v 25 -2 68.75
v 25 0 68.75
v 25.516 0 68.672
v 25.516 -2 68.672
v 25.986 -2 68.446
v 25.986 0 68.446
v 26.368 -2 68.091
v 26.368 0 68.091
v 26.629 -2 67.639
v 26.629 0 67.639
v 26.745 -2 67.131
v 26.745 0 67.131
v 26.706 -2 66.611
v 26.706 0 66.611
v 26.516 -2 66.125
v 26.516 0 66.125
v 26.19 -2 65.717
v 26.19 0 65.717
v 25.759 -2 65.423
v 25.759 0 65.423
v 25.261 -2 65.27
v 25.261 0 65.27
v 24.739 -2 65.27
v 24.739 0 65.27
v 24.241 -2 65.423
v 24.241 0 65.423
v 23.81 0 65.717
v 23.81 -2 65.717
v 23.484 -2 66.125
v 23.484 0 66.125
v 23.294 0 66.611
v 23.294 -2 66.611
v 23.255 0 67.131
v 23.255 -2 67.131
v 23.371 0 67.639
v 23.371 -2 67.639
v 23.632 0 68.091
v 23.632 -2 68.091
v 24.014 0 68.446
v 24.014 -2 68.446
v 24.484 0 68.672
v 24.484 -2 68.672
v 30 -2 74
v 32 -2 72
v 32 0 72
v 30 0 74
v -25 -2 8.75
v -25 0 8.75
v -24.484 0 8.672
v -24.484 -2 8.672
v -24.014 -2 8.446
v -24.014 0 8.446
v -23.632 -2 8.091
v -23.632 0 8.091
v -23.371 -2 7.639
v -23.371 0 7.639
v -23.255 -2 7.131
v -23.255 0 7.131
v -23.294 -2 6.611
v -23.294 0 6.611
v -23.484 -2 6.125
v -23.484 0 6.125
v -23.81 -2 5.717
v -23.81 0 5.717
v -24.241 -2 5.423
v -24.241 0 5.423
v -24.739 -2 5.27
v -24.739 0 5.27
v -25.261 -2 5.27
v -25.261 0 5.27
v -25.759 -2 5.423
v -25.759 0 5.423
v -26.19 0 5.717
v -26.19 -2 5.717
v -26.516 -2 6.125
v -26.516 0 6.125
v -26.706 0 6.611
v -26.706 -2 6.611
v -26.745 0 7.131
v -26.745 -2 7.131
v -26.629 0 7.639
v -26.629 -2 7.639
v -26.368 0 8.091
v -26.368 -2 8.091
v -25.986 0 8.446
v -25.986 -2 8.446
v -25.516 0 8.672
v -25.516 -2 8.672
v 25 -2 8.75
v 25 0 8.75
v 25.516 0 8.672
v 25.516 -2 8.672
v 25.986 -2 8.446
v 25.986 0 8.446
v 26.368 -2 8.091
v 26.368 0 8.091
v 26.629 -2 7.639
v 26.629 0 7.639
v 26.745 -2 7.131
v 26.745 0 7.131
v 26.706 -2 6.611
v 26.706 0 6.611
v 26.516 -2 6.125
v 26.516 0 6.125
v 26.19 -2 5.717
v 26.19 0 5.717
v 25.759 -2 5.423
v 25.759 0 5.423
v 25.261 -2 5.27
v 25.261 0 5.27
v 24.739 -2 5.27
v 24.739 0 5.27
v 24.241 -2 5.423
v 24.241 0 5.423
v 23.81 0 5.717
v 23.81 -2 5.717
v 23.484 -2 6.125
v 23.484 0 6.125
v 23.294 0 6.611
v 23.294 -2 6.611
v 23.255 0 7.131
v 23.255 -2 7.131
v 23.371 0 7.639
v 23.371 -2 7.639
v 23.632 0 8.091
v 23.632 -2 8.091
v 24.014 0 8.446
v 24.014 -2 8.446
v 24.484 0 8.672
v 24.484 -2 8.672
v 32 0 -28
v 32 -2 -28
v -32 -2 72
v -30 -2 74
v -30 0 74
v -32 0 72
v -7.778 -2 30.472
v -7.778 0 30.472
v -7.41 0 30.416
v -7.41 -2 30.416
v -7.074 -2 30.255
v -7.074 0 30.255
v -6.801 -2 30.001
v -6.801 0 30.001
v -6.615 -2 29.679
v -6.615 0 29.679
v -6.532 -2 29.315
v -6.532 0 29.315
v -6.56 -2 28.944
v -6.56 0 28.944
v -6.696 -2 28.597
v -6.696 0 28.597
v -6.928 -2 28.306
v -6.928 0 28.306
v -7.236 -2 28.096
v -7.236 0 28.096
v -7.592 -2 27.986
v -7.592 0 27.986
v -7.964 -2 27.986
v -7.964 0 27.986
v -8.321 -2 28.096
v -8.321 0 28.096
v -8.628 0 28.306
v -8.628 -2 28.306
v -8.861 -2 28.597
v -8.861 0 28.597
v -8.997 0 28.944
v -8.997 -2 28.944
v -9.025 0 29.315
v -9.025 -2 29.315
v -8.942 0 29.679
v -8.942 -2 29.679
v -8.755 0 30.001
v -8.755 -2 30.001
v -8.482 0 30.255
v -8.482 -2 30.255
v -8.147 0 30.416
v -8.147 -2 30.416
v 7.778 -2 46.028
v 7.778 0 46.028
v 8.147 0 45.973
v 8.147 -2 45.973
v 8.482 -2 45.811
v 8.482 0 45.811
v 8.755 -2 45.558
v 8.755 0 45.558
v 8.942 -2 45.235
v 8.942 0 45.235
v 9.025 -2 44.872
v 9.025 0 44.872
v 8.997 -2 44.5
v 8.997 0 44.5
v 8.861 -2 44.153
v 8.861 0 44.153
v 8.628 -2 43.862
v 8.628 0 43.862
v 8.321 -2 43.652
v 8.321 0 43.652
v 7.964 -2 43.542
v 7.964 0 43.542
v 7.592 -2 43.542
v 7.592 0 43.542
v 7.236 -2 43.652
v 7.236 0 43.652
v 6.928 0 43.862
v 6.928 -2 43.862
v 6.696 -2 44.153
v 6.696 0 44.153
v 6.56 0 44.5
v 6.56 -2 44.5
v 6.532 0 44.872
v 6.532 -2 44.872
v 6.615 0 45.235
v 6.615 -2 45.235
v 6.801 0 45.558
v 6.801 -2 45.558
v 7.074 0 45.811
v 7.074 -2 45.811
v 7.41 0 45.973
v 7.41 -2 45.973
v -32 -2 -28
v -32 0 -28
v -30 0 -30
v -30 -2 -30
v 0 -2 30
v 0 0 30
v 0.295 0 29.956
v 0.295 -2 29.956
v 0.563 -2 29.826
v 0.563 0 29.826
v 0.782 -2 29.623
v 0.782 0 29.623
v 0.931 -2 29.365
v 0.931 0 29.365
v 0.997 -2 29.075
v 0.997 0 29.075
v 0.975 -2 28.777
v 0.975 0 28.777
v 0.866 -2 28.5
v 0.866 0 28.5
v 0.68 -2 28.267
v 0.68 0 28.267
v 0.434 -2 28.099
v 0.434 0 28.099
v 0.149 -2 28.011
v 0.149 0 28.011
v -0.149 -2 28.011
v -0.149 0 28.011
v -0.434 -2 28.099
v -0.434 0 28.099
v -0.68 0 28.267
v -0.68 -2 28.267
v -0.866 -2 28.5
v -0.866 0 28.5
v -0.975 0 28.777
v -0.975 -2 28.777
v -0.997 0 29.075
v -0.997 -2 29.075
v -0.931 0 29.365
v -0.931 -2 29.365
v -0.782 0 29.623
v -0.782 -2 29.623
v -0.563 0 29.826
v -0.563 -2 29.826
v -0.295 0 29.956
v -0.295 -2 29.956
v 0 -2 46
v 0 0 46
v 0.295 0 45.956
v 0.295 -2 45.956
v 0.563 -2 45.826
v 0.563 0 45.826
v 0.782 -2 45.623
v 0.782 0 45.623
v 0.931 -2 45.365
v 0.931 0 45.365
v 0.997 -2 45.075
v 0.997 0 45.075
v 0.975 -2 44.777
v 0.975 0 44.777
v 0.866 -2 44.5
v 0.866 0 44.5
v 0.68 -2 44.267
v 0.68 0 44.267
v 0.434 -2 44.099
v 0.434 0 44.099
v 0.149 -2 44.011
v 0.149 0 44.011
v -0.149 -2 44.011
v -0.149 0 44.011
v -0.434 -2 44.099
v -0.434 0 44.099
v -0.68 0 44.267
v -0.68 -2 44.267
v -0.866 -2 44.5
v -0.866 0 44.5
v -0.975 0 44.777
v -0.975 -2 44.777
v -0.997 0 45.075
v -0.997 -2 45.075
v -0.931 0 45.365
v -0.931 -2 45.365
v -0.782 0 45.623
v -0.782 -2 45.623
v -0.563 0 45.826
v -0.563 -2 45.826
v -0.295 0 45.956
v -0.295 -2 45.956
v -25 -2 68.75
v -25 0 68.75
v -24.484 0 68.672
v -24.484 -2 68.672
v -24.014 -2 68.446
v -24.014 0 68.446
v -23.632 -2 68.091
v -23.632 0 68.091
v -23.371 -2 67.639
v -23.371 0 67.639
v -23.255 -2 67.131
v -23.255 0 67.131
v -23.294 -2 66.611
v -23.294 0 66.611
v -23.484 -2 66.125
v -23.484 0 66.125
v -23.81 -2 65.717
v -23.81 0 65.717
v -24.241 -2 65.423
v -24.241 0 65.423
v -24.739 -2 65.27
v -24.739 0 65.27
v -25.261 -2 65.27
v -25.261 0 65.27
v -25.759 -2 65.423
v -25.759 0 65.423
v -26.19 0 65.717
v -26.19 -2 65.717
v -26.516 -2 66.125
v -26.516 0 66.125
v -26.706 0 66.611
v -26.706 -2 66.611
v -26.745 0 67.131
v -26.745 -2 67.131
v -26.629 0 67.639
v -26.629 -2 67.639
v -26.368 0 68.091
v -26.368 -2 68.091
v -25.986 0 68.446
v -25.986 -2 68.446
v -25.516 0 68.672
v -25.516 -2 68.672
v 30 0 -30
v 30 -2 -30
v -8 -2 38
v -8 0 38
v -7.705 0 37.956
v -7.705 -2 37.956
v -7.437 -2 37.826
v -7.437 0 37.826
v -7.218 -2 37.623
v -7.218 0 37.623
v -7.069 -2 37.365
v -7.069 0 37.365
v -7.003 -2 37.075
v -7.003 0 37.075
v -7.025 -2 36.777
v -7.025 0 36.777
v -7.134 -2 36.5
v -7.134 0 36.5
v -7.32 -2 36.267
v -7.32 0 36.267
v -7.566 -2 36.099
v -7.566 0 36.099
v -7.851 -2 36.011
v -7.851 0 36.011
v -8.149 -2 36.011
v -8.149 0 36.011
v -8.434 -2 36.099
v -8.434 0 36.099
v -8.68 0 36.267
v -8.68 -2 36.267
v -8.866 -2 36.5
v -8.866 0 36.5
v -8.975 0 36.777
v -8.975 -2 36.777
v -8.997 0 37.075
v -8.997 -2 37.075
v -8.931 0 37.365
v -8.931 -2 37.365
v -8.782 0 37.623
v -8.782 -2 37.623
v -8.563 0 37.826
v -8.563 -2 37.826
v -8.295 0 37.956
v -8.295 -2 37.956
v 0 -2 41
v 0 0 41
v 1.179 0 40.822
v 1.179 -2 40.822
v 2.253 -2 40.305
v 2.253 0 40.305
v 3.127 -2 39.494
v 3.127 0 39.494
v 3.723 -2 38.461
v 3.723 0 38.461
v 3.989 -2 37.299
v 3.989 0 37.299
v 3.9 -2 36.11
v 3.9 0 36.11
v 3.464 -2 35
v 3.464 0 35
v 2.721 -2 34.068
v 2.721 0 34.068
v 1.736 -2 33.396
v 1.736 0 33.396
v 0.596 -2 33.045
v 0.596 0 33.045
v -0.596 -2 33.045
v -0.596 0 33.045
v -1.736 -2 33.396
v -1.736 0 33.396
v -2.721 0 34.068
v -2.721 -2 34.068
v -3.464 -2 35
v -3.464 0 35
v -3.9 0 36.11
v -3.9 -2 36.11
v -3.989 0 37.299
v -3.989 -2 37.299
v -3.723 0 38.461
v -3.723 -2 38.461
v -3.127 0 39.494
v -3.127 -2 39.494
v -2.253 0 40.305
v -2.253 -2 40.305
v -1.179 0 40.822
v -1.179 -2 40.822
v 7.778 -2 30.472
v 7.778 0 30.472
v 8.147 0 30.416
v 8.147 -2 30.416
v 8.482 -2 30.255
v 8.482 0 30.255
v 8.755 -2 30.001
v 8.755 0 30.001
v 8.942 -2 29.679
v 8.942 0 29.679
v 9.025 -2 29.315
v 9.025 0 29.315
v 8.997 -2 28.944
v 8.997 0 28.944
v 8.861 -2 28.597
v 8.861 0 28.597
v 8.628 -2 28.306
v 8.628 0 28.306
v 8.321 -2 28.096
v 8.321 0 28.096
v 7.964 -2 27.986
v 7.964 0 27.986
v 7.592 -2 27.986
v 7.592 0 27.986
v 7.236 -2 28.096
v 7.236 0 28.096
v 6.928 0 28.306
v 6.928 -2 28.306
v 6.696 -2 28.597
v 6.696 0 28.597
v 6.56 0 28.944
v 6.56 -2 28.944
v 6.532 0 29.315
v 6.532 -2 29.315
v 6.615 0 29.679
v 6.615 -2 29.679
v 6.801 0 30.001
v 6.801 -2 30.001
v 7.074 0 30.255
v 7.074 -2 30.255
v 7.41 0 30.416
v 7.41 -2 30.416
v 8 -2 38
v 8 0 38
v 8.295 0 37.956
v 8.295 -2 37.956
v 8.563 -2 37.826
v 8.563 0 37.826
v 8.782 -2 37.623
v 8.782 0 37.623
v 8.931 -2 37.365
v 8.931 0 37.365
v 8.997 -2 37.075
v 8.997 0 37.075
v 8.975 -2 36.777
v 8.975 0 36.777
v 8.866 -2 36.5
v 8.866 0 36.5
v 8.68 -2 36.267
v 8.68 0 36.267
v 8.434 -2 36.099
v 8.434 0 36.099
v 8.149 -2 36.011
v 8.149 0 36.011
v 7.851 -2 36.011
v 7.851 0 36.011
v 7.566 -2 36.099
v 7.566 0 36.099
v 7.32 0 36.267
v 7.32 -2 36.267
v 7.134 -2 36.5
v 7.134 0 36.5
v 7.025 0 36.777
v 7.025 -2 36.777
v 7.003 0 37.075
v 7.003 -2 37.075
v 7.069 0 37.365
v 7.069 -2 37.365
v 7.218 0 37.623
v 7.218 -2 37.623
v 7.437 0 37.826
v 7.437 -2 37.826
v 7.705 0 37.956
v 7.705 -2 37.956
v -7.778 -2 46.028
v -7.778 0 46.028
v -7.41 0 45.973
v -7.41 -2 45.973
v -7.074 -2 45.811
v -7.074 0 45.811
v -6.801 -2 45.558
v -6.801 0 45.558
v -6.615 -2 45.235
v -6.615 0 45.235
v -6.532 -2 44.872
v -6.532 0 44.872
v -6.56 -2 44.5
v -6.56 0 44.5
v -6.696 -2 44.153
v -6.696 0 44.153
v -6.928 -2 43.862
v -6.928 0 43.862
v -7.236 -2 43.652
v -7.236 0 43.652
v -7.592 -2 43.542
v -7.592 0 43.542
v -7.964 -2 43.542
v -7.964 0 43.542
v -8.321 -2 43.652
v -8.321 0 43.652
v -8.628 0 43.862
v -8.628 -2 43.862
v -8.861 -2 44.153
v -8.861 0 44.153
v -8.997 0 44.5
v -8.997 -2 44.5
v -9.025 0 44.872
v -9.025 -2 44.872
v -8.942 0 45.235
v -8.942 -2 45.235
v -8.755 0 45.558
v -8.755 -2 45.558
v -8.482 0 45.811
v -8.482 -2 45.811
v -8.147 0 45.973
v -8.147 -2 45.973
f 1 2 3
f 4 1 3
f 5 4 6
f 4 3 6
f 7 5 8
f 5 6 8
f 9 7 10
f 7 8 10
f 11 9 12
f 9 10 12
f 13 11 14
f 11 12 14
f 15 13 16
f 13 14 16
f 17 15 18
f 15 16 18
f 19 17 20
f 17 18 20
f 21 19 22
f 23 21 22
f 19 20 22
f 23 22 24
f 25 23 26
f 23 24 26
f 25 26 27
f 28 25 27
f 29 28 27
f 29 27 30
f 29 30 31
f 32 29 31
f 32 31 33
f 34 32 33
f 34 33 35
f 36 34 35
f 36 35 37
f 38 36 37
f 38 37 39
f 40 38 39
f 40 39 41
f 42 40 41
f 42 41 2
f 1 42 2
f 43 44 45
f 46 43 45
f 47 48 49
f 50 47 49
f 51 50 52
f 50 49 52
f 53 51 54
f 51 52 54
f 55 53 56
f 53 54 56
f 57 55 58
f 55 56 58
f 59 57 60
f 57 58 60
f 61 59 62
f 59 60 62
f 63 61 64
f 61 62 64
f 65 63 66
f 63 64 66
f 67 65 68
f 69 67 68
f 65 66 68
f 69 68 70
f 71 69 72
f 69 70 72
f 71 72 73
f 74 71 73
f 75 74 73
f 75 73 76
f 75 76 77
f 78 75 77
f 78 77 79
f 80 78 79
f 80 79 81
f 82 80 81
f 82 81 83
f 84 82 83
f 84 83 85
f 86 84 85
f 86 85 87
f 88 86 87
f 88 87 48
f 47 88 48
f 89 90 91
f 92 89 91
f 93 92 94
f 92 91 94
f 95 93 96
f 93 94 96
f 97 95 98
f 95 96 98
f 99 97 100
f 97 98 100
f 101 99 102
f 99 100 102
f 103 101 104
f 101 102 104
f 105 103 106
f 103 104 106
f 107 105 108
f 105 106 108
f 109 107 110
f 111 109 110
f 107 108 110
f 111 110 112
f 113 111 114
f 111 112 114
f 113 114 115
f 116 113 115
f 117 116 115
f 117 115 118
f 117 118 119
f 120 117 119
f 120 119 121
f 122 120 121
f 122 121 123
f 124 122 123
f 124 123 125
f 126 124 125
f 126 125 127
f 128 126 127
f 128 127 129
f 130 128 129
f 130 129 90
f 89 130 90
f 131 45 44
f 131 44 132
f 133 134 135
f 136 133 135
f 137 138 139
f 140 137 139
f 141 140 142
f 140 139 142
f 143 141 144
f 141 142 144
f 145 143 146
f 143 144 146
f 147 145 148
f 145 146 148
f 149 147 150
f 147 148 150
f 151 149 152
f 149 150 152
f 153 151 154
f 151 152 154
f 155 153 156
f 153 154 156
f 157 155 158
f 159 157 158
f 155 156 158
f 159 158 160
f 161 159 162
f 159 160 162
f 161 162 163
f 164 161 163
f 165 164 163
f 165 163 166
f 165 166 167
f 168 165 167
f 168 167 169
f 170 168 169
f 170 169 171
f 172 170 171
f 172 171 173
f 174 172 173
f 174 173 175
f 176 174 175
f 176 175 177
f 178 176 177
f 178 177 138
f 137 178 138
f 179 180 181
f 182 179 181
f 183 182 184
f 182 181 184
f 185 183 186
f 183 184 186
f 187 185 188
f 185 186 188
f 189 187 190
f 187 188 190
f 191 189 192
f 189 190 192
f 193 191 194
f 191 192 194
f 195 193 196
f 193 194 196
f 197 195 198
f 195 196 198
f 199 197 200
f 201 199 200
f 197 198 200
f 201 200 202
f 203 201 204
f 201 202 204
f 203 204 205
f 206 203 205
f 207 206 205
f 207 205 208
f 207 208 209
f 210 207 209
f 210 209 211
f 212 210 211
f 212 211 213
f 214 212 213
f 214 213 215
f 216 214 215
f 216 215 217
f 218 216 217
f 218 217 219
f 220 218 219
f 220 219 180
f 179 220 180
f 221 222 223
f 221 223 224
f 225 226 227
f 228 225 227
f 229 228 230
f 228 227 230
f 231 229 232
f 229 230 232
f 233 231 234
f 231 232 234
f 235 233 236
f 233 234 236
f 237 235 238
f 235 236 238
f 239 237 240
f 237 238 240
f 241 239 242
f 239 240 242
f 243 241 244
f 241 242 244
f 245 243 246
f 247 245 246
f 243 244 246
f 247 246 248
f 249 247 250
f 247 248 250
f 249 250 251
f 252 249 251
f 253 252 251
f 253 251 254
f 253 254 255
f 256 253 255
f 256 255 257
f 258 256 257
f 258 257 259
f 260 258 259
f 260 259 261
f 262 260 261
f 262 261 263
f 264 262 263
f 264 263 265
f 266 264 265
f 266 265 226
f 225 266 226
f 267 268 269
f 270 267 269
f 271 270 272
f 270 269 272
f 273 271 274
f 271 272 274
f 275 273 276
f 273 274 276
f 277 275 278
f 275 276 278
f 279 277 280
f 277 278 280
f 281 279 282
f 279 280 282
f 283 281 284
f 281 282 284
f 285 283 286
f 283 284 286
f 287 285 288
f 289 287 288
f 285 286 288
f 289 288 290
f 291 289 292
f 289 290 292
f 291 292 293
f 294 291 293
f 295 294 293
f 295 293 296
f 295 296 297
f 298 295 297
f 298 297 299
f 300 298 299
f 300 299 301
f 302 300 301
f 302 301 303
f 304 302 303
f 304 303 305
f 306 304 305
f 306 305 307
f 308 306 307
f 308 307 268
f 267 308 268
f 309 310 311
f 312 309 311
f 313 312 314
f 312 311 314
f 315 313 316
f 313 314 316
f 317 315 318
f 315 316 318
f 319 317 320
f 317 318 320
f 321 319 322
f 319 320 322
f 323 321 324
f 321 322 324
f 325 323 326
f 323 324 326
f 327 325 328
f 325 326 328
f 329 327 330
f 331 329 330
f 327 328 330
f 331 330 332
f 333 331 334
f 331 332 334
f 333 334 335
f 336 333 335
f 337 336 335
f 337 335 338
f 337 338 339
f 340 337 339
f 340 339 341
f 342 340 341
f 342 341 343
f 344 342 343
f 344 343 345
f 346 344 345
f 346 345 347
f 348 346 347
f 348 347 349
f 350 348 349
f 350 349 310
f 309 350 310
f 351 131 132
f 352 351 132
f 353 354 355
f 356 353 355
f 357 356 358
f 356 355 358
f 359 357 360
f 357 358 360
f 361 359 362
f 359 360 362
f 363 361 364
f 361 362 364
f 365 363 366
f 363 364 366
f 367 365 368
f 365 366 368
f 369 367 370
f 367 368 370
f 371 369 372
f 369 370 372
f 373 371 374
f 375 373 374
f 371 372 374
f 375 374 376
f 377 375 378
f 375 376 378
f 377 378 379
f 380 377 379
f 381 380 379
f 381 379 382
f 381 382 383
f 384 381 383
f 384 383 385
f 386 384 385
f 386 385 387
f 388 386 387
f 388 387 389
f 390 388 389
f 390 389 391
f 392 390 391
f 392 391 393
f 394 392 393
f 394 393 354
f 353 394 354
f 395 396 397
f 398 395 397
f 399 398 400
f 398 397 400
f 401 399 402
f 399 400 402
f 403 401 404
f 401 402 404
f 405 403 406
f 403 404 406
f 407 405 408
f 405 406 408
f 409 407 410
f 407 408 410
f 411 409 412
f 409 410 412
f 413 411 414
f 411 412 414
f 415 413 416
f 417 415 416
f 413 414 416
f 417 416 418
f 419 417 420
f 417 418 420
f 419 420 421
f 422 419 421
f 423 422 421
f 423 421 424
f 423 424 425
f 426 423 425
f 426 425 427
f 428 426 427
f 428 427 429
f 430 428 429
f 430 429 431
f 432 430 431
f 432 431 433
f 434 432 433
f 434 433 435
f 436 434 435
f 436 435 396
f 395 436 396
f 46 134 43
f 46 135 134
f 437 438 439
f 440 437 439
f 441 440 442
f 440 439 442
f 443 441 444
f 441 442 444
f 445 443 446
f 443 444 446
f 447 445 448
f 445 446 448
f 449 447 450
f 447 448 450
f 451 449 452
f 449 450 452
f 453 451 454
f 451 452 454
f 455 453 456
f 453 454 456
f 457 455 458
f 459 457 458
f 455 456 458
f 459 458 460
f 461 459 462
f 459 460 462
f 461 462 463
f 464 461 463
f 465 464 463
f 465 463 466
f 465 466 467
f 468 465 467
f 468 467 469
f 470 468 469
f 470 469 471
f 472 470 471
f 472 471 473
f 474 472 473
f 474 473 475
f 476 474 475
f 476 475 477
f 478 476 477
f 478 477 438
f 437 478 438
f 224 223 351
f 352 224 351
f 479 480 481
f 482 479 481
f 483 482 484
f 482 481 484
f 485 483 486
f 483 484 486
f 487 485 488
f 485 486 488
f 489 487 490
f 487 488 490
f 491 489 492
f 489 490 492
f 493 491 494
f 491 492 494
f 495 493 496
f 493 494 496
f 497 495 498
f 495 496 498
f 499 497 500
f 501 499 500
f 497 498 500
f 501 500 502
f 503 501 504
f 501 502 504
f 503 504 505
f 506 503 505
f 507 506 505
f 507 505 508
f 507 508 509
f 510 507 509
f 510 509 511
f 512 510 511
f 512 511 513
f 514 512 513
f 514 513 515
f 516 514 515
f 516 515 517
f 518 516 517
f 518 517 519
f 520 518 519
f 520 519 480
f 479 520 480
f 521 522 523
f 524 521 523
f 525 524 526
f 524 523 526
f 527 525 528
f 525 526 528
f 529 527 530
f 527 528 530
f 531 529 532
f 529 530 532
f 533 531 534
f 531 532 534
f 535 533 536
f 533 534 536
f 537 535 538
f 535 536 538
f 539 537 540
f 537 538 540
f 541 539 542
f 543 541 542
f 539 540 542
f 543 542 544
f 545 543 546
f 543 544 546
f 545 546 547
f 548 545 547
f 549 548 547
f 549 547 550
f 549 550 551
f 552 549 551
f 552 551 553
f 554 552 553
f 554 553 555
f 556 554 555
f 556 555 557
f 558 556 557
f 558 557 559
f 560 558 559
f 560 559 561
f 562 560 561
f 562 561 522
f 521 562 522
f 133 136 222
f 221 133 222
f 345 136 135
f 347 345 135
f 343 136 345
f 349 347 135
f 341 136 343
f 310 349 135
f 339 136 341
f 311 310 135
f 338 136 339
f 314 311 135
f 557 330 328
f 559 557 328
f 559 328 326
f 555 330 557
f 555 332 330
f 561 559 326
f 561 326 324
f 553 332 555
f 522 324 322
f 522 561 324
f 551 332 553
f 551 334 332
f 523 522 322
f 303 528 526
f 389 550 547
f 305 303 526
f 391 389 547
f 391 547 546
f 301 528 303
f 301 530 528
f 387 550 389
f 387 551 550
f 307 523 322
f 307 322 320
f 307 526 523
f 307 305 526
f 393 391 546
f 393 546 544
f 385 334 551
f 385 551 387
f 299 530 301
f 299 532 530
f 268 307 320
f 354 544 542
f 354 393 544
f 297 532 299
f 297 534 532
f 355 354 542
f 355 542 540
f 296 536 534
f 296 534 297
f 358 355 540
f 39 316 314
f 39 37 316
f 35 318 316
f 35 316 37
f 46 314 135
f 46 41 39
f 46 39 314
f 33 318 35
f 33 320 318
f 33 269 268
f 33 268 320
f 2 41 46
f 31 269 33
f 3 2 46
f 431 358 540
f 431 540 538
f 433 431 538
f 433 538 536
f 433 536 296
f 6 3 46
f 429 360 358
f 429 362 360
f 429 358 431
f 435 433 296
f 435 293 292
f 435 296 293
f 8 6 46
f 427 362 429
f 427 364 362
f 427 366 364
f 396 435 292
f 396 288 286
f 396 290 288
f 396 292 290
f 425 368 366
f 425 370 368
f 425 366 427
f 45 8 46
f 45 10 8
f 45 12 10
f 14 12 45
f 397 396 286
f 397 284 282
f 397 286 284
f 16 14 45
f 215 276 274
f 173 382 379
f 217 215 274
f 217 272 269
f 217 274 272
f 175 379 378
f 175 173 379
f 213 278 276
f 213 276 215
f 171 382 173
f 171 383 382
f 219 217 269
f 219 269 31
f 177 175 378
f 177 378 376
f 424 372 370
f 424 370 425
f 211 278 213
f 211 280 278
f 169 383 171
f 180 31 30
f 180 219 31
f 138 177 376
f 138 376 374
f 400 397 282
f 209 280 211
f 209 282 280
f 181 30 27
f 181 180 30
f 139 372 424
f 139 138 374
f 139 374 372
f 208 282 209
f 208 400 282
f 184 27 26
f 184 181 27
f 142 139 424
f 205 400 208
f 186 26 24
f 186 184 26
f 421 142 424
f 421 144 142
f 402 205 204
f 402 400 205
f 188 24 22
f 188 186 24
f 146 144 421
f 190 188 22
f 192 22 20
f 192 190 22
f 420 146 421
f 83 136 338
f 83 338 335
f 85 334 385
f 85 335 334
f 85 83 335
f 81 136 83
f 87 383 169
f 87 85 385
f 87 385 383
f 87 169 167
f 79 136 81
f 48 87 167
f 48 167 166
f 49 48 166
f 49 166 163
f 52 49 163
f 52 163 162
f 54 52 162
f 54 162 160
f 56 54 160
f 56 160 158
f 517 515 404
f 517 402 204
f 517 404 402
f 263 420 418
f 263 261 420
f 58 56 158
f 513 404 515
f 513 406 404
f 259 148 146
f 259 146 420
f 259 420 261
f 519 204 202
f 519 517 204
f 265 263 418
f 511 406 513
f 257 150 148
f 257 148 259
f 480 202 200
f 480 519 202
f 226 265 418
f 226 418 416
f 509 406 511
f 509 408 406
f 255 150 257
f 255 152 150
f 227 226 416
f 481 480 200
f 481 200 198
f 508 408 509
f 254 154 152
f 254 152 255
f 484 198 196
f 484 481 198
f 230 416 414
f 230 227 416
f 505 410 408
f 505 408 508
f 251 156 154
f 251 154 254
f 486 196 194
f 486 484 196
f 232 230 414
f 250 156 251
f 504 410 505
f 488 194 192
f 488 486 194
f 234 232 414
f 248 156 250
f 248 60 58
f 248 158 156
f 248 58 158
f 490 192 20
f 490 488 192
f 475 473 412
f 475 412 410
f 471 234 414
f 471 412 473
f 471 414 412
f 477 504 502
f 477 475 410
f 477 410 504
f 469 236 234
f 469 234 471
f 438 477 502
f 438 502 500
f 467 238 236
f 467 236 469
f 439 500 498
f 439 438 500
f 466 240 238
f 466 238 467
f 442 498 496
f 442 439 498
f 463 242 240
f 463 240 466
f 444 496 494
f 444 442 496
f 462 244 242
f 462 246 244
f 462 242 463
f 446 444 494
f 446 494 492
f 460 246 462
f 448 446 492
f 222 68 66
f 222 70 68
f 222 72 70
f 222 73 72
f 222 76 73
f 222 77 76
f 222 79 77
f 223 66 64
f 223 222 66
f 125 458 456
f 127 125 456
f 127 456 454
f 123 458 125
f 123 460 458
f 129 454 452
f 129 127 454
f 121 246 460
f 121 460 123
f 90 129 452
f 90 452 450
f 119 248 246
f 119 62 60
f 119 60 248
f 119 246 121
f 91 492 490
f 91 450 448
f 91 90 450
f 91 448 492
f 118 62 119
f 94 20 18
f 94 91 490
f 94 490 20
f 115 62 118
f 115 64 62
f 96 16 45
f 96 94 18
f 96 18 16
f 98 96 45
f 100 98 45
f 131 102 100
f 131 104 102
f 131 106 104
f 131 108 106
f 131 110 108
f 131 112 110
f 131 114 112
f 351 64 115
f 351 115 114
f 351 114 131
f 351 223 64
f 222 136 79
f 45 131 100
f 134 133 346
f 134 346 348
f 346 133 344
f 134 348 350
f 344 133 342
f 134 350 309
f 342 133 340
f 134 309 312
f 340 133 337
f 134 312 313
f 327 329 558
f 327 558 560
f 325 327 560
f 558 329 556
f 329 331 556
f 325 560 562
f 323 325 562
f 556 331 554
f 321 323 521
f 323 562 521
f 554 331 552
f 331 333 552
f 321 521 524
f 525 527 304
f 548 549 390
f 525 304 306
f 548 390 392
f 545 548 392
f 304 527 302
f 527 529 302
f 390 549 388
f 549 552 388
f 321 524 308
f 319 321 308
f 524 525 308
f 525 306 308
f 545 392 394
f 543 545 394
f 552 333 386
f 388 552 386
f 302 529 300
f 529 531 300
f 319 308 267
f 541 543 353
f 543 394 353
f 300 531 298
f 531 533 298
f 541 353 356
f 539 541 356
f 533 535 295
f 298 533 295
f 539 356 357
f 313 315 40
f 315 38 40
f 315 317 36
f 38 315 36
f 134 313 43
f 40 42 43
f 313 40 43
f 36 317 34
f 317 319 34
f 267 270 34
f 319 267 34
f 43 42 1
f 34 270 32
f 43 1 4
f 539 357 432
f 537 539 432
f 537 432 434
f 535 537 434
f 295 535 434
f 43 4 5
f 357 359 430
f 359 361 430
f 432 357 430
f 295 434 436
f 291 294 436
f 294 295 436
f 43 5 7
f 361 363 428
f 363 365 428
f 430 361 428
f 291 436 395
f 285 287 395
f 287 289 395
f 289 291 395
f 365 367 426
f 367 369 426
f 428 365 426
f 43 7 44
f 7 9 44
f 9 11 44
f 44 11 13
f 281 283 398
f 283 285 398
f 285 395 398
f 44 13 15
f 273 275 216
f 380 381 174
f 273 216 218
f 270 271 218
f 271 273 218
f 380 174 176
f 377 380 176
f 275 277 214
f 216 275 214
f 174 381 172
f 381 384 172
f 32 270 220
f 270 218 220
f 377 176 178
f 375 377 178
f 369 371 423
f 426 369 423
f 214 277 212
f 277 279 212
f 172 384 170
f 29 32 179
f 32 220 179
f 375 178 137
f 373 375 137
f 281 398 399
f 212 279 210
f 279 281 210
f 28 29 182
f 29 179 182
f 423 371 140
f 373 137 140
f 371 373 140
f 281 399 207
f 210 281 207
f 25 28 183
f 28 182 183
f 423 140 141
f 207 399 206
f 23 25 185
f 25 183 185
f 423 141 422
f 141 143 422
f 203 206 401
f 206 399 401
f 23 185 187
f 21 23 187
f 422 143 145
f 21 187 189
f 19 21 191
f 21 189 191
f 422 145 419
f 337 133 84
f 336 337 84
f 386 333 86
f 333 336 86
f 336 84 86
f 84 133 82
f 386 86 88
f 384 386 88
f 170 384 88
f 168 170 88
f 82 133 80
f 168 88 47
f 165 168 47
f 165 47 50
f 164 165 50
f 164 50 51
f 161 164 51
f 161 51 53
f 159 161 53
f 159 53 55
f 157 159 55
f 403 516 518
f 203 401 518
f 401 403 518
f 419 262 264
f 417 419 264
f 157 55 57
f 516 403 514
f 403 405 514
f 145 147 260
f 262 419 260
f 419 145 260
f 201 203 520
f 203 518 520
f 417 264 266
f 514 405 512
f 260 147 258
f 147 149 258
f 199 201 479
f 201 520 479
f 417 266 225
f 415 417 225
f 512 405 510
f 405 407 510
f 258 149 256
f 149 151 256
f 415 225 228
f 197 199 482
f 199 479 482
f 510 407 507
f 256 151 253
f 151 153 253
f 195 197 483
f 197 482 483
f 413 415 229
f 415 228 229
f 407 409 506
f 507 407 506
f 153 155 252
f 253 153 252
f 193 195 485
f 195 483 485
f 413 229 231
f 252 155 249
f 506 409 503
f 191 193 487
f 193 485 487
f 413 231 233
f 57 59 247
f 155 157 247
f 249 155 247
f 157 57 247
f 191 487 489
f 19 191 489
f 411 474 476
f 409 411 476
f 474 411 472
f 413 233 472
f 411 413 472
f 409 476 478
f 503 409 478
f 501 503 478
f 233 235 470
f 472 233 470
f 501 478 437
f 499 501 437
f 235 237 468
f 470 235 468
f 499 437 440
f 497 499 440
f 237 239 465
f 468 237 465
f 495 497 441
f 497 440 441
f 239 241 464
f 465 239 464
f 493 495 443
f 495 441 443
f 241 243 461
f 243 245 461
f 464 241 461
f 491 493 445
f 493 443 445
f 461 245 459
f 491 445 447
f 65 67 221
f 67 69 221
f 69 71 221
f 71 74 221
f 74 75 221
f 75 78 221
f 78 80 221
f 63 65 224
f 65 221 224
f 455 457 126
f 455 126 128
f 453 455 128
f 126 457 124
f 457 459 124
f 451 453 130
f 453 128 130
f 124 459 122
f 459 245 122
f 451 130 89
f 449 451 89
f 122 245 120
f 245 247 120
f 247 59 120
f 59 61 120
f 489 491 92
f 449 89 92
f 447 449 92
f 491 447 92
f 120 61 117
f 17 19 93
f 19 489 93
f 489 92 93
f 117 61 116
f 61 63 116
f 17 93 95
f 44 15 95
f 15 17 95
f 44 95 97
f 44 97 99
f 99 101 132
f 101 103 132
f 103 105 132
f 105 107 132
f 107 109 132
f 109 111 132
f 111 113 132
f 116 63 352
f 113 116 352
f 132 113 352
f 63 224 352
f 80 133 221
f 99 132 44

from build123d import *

# Parameters (mm, degrees)
SKETCH1_W          = 64
SKETCH1_H          = 2
BASE_FLANGE1_DEPTH = 74
SKETCH2_R          = 1.75
CUT_EXTRUDE1_DEPTH = 10
CUT_EXTRUDE2_REACH = 82.647
SKETCH4_R          = 4
CHAMFER1_SIZE      = 2
CUT_EXTRUDE5_REACH = 82.647
SKETCH7_R          = 1
SKETCH7_R_2        = 1.25
SKETCH8_W          = 64
SKETCH8_H          = 30
TAB1_DEPTH         = 2
CHAMFER2_SIZE      = 2


# Sheet-metal steps are written as plain solids
with BuildPart() as part:
    # Sketch1 → Base-Flange1 (new body)
    with BuildSketch(Plane.XY):
        with Locations((0, -1)):
            Rectangle(SKETCH1_W, SKETCH1_H)
    extrude(amount=BASE_FLANGE1_DEPTH)

    # Sketch2 → Cut-Extrude1 (cut)
    with BuildSketch(Plane(origin=(0, 0, 0), x_dir=(1, 0, 0), z_dir=(0, 1, 0))):
        with Locations(Location((-25, -7, 0), (0, 0, 270))):
            Circle(SKETCH2_R)
        with Locations(Location((-25, -67, 0), (0, 0, 270))):
            Circle(SKETCH2_R)
        with Locations(Location((25, -67, 0), (0, 0, 270))):
            Circle(SKETCH2_R)
        with Locations(Location((25, -7, 0), (0, 0, 270))):
            Circle(SKETCH2_R)
    extrude(amount=-CUT_EXTRUDE1_DEPTH, mode=Mode.SUBTRACT)

    # Sketch4 → Cut-Extrude2 (cut, up to next)
    with BuildSketch(Plane(origin=(0, 0, 0), x_dir=(1, 0, 0), z_dir=(0, 1, 0)), mode=Mode.PRIVATE) as cut_extrude2_sk1:
        with Locations(Location((0, -37, 0), (0, 0, 270))):
            Circle(SKETCH4_R)
    cut_extrude2_tool1 = extrude(cut_extrude2_sk1.sketch, amount=-CUT_EXTRUDE2_REACH, mode=Mode.PRIVATE) & part.part
    add(cut_extrude2_tool1.solids().sort_by_distance((0, 0, 37))[0], mode=Mode.SUBTRACT)

    # Chamfer1
    chamfer1_edges = [part.edges().sort_by_distance(p)[0] for p in [
        (-32, -1, 74),
        (32, -1, 74),
    ]]
    chamfer(chamfer1_edges, length=CHAMFER1_SIZE)

    # Sketch7 → Cut-Extrude5 (cut, up to next)
    with BuildSketch(Plane(origin=(0, 0, 0), x_dir=(1, 0, 0), z_dir=(0, 1, 0)), mode=Mode.PRIVATE) as cut_extrude5_sk1:
        with Locations(Location((-8, -37, 0), (0, 0, 270))):
            Circle(SKETCH7_R)
    cut_extrude5_tool1 = extrude(cut_extrude5_sk1.sketch, amount=-CUT_EXTRUDE5_REACH, mode=Mode.PRIVATE) & part.part
    # Sketch7 → Cut-Extrude5 (cut, up to next)
    with BuildSketch(Plane(origin=(0, 0, 0), x_dir=(1, 0, 0), z_dir=(0, 1, 0)), mode=Mode.PRIVATE) as cut_extrude5_sk2:
        with Locations(Location((8, -37, 0), (0, 0, 270))):
            Circle(SKETCH7_R)
    cut_extrude5_tool2 = extrude(cut_extrude5_sk2.sketch, amount=-CUT_EXTRUDE5_REACH, mode=Mode.PRIVATE) & part.part
    # Sketch7 → Cut-Extrude5 (cut, up to next)
    with BuildSketch(Plane(origin=(0, 0, 0), x_dir=(1, 0, 0), z_dir=(0, 1, 0)), mode=Mode.PRIVATE) as cut_extrude5_sk3:
        with Locations(Location((0, -45, 0), (0, 0, 270))):
            Circle(SKETCH7_R)
    cut_extrude5_tool3 = extrude(cut_extrude5_sk3.sketch, amount=-CUT_EXTRUDE5_REACH, mode=Mode.PRIVATE) & part.part
    # Sketch7 → Cut-Extrude5 (cut, up to next)
    with BuildSketch(Plane(origin=(0, 0, 0), x_dir=(1, 0, 0), z_dir=(0, 1, 0)), mode=Mode.PRIVATE) as cut_extrude5_sk4:
        with Locations(Location((0, -29, 0), (0, 0, 270))):
            Circle(SKETCH7_R)
    cut_extrude5_tool4 = extrude(cut_extrude5_sk4.sketch, amount=-CUT_EXTRUDE5_REACH, mode=Mode.PRIVATE) & part.part
    # Sketch7 → Cut-Extrude5 (cut, up to next)
    with BuildSketch(Plane(origin=(0, 0, 0), x_dir=(1, 0, 0), z_dir=(0, 1, 0)), mode=Mode.PRIVATE) as cut_extrude5_sk5:
        with Locations(Location((-7.778174593, -44.778174593, 0), (0, 0, 270))):
            Circle(SKETCH7_R_2)
    cut_extrude5_tool5 = extrude(cut_extrude5_sk5.sketch, amount=-CUT_EXTRUDE5_REACH, mode=Mode.PRIVATE) & part.part
    # Sketch7 → Cut-Extrude5 (cut, up to next)
    with BuildSketch(Plane(origin=(0, 0, 0), x_dir=(1, 0, 0), z_dir=(0, 1, 0)), mode=Mode.PRIVATE) as cut_extrude5_sk6:
        with Locations(Location((-7.778174593, -29.221825407, 0), (0, 0, 270))):
            Circle(SKETCH7_R_2)
    cut_extrude5_tool6 = extrude(cut_extrude5_sk6.sketch, amount=-CUT_EXTRUDE5_REACH, mode=Mode.PRIVATE) & part.part
    # Sketch7 → Cut-Extrude5 (cut, up to next)
    with BuildSketch(Plane(origin=(0, 0, 0), x_dir=(1, 0, 0), z_dir=(0, 1, 0)), mode=Mode.PRIVATE) as cut_extrude5_sk7:
        with Locations(Location((7.778174593, -29.221825407, 0), (0, 0, 270))):
            Circle(SKETCH7_R_2)
    cut_extrude5_tool7 = extrude(cut_extrude5_sk7.sketch, amount=-CUT_EXTRUDE5_REACH, mode=Mode.PRIVATE) & part.part
    # Sketch7 → Cut-Extrude5 (cut, up to next)
    with BuildSketch(Plane(origin=(0, 0, 0), x_dir=(1, 0, 0), z_dir=(0, 1, 0)), mode=Mode.PRIVATE) as cut_extrude5_sk8:
        with Locations(Location((7.778174593, -44.778174593, 0), (0, 0, 270))):
            Circle(SKETCH7_R_2)
    cut_extrude5_tool8 = extrude(cut_extrude5_sk8.sketch, amount=-CUT_EXTRUDE5_REACH, mode=Mode.PRIVATE) & part.part
    add(cut_extrude5_tool1.solids().sort_by_distance((-8, 0, 37))[0], mode=Mode.SUBTRACT)
    add(cut_extrude5_tool2.solids().sort_by_distance((8, 0, 37))[0], mode=Mode.SUBTRACT)
    add(cut_extrude5_tool3.solids().sort_by_distance((0, 0, 45))[0], mode=Mode.SUBTRACT)
    add(cut_extrude5_tool4.solids().sort_by_distance((0, 0, 29))[0], mode=Mode.SUBTRACT)
    add(cut_extrude5_tool5.solids().sort_by_distance((-7.778175, 0, 44.778175))[0], mode=Mode.SUBTRACT)
    add(cut_extrude5_tool6.solids().sort_by_distance((-7.778175, 0, 29.221825))[0], mode=Mode.SUBTRACT)
    add(cut_extrude5_tool7.solids().sort_by_distance((7.778175, 0, 29.221825))[0], mode=Mode.SUBTRACT)
    add(cut_extrude5_tool8.solids().sort_by_distance((7.778175, 0, 44.778175))[0], mode=Mode.SUBTRACT)

    # Sketch8 → Tab1 (add)
    with BuildSketch(Plane(origin=(0, 0, 0), x_dir=(1, 0, 0), z_dir=(0, 1, 0))):
        with Locations((0, 15)):
            Rectangle(SKETCH8_W, SKETCH8_H)
    extrude(amount=-TAB1_DEPTH)

    # Chamfer2
    chamfer2_edges = [part.edges().sort_by_distance(p)[0] for p in [
        (-32, -1, -30),
        (32, -1, -30),
    ]]
    chamfer(chamfer2_edges, length=CHAMFER2_SIZE)


solid = part.part
